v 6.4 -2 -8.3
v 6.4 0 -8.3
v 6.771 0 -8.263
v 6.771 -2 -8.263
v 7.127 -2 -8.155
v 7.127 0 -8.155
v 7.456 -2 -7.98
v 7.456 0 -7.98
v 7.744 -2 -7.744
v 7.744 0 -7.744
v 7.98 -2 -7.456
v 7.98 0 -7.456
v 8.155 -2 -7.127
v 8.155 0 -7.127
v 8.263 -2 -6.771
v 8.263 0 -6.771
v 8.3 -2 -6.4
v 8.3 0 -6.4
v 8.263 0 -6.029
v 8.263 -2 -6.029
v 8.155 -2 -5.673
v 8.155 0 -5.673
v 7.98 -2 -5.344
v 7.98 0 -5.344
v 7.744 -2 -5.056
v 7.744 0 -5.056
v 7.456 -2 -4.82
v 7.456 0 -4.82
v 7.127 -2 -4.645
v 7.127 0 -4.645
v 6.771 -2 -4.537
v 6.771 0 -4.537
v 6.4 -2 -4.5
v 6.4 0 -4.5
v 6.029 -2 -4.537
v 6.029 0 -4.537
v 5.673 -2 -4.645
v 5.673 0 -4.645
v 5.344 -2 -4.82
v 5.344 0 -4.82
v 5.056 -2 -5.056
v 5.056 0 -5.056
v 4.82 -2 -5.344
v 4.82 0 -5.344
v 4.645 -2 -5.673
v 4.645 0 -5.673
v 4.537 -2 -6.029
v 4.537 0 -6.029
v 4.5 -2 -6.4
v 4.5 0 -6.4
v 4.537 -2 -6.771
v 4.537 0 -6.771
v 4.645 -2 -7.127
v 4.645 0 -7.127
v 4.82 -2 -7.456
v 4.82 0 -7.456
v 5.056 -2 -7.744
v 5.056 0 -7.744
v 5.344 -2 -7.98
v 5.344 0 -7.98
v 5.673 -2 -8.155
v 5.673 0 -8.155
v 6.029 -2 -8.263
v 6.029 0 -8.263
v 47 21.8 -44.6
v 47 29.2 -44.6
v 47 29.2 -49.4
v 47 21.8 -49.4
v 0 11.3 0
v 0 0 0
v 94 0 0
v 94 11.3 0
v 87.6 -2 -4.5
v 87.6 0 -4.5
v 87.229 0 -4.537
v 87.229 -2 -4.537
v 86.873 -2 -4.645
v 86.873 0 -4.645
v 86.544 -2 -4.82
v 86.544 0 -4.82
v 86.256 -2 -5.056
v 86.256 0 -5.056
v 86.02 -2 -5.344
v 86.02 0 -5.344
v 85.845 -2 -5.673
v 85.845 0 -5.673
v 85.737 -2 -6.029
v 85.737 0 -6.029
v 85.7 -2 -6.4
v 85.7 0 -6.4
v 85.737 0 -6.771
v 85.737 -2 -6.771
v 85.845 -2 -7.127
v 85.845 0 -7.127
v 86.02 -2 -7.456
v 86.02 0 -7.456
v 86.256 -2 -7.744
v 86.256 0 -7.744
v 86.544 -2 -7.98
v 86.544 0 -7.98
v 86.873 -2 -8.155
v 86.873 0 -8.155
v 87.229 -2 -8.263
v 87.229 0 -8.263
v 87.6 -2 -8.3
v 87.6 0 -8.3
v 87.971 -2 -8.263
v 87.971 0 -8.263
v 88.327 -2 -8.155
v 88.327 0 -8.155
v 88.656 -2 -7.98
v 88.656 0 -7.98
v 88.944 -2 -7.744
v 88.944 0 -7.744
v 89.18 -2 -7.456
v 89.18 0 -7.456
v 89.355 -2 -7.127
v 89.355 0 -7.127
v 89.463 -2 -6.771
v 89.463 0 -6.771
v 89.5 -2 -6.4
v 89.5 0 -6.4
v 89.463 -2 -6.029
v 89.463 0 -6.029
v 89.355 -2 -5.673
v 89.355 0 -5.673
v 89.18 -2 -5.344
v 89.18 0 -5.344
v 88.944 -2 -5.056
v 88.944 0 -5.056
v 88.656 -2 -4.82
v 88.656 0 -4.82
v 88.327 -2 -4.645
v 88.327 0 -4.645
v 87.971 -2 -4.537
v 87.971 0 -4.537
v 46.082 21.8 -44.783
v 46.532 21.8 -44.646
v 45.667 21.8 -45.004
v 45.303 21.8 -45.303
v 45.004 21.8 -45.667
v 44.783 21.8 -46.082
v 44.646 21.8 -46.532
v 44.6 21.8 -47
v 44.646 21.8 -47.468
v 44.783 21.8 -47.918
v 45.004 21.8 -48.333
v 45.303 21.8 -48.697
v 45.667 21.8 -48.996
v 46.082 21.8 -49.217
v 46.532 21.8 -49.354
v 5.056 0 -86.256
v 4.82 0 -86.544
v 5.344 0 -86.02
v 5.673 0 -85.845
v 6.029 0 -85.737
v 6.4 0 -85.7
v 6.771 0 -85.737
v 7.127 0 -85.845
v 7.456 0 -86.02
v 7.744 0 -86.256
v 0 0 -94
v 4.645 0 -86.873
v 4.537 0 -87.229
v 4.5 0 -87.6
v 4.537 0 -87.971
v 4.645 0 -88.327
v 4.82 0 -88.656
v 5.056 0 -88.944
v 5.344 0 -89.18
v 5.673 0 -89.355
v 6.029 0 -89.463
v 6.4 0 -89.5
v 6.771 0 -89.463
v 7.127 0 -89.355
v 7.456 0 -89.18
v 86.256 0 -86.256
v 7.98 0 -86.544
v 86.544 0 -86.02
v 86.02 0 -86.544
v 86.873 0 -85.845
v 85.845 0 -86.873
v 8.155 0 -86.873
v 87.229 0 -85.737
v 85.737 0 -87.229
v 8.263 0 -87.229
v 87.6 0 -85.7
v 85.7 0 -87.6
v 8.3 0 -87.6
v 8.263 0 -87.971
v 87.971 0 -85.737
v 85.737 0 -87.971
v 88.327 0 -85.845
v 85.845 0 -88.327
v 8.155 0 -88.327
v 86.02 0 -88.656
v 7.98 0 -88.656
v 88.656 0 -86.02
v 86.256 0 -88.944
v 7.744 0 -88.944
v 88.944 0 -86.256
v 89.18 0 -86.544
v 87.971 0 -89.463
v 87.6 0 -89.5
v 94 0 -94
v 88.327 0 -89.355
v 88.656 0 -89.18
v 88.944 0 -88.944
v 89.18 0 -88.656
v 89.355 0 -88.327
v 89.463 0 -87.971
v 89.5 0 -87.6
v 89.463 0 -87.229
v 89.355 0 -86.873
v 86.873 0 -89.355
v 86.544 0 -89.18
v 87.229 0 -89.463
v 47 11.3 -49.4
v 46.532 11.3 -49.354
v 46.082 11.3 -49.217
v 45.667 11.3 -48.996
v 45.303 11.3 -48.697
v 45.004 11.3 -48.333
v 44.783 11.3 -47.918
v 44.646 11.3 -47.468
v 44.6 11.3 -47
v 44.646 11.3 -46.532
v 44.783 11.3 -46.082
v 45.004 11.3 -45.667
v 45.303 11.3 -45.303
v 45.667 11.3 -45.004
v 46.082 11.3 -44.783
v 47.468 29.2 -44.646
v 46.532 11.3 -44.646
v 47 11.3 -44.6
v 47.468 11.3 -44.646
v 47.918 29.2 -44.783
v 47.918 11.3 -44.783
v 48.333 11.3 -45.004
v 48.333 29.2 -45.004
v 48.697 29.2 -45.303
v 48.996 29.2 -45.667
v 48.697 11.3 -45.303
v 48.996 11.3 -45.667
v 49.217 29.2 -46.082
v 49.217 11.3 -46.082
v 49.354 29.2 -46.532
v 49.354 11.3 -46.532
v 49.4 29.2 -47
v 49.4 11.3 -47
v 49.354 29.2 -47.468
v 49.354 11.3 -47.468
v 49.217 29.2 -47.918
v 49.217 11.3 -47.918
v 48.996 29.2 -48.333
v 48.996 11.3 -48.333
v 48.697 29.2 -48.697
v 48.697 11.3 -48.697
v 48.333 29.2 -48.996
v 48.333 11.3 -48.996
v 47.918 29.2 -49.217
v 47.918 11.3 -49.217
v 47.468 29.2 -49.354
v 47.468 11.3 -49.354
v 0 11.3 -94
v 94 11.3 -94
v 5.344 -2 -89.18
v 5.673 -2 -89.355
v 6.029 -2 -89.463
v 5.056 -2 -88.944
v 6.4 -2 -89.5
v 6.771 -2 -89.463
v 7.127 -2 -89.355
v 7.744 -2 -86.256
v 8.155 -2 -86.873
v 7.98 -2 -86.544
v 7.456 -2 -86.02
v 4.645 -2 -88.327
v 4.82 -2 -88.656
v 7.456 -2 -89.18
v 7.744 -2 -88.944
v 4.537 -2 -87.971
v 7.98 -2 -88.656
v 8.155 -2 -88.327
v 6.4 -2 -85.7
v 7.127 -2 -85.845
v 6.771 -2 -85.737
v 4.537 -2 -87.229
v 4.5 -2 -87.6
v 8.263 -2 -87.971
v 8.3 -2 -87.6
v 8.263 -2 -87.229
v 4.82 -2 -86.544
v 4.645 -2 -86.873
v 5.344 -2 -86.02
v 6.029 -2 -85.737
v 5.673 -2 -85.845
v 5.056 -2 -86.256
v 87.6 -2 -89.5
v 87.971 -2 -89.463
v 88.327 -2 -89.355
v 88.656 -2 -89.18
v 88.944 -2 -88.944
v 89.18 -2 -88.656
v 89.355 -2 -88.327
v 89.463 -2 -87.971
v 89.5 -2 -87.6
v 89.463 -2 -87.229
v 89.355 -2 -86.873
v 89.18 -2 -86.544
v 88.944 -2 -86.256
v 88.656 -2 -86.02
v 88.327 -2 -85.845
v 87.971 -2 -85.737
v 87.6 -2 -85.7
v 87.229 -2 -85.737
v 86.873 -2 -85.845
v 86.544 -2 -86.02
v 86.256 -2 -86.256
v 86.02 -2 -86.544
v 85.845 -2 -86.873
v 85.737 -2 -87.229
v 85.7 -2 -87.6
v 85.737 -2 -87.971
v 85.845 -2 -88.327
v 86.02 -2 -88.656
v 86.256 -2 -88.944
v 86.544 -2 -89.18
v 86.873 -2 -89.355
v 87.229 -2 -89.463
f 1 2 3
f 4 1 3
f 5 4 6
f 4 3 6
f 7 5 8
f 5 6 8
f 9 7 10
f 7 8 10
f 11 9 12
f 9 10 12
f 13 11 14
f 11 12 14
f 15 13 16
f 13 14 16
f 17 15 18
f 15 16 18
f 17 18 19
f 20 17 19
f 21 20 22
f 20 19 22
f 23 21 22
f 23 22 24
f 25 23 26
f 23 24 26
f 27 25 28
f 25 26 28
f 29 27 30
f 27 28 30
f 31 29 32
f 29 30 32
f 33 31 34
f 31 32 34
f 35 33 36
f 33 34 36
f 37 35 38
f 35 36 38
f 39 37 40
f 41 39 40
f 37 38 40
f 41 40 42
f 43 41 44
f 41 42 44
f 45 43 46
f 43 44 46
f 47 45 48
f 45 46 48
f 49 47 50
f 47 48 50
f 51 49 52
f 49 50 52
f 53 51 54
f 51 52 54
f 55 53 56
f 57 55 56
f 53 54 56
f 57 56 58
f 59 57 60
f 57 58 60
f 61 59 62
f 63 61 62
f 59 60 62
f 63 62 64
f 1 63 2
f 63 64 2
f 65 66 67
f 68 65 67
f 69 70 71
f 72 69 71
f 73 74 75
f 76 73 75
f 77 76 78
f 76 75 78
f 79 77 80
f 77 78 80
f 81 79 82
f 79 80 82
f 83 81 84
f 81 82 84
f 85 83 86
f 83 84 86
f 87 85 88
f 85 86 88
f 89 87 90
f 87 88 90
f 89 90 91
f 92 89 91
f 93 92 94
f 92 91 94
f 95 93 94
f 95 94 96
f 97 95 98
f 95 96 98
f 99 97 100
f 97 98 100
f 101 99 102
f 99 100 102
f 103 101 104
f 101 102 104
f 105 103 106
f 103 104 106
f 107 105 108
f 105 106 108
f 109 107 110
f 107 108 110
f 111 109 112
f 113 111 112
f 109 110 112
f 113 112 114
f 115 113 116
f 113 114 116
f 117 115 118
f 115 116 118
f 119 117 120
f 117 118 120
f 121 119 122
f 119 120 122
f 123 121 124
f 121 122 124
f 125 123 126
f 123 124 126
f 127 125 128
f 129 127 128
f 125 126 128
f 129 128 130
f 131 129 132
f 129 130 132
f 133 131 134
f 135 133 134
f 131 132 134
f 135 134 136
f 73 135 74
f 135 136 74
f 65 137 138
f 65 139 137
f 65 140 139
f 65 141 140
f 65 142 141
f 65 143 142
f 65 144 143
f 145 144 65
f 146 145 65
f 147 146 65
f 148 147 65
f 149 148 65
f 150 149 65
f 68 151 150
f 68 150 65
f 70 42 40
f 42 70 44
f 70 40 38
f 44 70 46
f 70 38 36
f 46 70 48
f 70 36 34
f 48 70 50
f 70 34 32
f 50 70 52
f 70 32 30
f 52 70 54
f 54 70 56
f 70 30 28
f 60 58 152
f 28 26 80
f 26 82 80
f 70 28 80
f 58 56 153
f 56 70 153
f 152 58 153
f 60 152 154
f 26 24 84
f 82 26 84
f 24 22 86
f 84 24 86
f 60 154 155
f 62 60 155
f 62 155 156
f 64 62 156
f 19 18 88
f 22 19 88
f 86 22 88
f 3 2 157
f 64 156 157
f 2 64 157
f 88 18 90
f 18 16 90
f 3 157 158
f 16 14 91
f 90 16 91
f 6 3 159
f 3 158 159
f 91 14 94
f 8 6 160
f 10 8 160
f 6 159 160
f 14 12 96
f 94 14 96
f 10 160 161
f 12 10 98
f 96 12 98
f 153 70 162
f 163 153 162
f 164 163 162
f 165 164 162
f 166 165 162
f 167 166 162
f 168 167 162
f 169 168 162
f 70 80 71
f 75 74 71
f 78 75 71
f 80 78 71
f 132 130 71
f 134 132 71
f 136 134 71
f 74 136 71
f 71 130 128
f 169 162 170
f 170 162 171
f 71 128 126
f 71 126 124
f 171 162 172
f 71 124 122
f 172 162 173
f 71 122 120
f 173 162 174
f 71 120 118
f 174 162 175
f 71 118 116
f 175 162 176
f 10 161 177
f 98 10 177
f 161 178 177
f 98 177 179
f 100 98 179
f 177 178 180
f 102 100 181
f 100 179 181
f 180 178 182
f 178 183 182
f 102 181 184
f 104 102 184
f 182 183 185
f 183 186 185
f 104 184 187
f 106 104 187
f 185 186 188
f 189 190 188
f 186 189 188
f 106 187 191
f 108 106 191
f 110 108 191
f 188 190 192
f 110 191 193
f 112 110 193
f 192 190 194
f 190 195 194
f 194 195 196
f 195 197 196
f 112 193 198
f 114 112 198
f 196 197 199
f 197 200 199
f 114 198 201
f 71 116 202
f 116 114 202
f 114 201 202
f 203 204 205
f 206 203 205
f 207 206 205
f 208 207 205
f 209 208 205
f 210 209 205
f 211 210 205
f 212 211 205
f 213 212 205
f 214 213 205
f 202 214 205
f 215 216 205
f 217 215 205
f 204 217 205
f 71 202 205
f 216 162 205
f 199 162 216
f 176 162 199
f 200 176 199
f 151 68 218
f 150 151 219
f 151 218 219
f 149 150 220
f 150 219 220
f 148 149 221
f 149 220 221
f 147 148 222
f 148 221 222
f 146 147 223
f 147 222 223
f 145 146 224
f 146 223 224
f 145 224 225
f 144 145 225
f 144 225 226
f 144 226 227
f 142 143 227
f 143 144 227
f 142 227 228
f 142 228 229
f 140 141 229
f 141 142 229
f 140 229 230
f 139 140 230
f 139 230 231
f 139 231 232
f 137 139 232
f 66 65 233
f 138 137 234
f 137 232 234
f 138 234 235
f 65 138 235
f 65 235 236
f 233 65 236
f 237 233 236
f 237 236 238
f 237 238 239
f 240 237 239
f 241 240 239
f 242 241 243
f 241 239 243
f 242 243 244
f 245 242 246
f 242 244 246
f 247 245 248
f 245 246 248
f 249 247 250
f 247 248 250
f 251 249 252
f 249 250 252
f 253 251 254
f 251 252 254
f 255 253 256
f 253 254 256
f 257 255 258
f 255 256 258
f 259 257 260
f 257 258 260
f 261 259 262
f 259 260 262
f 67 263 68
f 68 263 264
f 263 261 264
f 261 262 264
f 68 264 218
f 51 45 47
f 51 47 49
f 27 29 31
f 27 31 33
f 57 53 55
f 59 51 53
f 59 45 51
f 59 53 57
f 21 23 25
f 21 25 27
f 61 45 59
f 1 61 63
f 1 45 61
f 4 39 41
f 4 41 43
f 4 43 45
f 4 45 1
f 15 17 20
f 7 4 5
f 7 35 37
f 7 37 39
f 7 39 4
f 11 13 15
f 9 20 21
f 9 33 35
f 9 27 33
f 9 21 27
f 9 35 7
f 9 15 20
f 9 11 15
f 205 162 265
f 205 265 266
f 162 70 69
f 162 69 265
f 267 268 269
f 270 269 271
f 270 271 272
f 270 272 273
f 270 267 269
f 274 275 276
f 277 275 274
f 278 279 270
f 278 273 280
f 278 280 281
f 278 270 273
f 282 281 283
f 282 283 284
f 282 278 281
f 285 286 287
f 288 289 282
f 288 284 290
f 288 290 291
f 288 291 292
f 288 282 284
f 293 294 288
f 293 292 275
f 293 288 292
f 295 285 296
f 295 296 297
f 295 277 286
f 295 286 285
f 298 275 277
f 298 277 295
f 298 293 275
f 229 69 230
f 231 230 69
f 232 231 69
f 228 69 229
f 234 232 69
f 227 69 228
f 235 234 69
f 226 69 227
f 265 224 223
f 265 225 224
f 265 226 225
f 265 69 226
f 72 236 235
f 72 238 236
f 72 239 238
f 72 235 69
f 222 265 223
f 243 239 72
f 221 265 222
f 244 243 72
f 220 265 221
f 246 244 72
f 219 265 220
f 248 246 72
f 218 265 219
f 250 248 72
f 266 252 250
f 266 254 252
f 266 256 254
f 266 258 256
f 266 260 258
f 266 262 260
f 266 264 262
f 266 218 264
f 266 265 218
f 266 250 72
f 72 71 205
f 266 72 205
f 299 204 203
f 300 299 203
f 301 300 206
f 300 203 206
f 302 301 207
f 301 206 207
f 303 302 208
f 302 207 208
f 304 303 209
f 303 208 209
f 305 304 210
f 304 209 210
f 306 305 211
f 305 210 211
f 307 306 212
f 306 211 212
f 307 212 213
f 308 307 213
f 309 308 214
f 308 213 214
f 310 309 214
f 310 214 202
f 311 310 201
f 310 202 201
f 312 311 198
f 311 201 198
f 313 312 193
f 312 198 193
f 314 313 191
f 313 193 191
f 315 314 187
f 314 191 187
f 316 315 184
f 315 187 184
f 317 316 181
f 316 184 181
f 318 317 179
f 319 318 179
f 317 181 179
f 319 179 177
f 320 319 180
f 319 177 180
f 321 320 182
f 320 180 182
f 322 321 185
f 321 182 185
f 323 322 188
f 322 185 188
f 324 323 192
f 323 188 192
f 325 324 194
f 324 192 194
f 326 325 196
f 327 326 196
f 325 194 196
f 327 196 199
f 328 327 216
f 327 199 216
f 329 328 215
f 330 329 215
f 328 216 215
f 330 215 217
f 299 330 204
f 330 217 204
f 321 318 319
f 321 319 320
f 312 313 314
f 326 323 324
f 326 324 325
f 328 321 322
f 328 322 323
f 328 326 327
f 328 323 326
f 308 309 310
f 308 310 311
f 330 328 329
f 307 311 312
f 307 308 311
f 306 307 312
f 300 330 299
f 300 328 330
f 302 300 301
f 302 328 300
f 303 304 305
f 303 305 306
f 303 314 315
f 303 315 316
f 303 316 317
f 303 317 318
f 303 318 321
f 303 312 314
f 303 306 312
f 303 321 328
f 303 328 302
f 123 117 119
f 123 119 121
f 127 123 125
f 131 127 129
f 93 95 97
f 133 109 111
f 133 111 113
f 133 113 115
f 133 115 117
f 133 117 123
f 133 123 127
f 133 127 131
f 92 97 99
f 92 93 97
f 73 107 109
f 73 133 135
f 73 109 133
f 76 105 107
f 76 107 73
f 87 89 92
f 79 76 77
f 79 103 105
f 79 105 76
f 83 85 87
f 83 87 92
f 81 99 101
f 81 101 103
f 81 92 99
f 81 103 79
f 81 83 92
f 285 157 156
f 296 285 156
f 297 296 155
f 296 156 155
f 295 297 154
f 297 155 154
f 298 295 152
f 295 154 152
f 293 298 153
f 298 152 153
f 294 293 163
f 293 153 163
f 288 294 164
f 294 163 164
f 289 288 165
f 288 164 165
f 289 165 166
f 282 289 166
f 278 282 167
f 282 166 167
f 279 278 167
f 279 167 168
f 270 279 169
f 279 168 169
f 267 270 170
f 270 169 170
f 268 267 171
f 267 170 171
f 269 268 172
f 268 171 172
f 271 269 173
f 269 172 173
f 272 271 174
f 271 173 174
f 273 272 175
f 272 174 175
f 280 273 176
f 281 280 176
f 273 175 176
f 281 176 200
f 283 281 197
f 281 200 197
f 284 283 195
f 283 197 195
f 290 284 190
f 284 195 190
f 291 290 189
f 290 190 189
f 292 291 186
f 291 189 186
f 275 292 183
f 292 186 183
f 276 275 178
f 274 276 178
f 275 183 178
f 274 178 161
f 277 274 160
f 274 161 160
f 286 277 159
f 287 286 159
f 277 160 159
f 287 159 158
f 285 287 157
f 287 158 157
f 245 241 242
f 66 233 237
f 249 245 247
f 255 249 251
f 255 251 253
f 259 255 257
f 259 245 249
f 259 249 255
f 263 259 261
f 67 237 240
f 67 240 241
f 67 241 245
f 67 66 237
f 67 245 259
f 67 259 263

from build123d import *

# Parameters (mm, degrees)
SKETCH1_W           = 94
SKETCH1_H           = 94
BOSS_EXTRUDE1_DEPTH = 11.3
SKETCH2_R           = 1.9
BOSS_EXTRUDE2_DEPTH = 2
SKETCH3_R           = 2.4
BOSS_EXTRUDE3_DEPTH = 17.9
SKETCH4_W           = 4
SKETCH4_H           = 7
CUT_EXTRUDE1_DEPTH  = 7.4


with BuildPart() as part:
    # Sketch1 → Boss-Extrude1 (new body)
    with BuildSketch(Plane(origin=(0, 0, 0), x_dir=(1, 0, 0), z_dir=(0, 1, 0))):
        with Locations((47, 47)):
            Rectangle(SKETCH1_W, SKETCH1_H)
    extrude(amount=BOSS_EXTRUDE1_DEPTH)

    # Sketch2 → Boss-Extrude2 (add)
    with BuildSketch(Plane.XZ):
        with Locations(Location((6.4, -6.4, 0), (0, 0, 270))):
            Circle(SKETCH2_R)
        with Locations(Location((6.4, -87.6, 0), (0, 0, 90))):
            Circle(SKETCH2_R)
        with Locations(Location((87.6, -87.6, 0), (0, 0, 270))):
            Circle(SKETCH2_R)
        with Locations(Location((87.6, -6.4, 0), (0, 0, 90))):
            Circle(SKETCH2_R)
    extrude(amount=BOSS_EXTRUDE2_DEPTH)

    # Sketch3 → Boss-Extrude3 (add)
    with BuildSketch(Plane(origin=(0, 11.3, 0), x_dir=(1, 0, 0), z_dir=(0, 1, 0))):
        with Locations(Location((47, 47, 0), (0, 0, 90))):
            Circle(SKETCH3_R)
    extrude(amount=BOSS_EXTRUDE3_DEPTH)

    # Sketch4 → Cut-Extrude1 (cut)
    with BuildSketch(Plane(origin=(0, 29.2, 0), x_dir=(1, 0, 0), z_dir=(0, 1, 0))):
        with Locations((45, 45.9)):
            Rectangle(SKETCH4_W, SKETCH4_H)
    extrude(amount=-CUT_EXTRUDE1_DEPTH, mode=Mode.SUBTRACT)


solid = part.part
